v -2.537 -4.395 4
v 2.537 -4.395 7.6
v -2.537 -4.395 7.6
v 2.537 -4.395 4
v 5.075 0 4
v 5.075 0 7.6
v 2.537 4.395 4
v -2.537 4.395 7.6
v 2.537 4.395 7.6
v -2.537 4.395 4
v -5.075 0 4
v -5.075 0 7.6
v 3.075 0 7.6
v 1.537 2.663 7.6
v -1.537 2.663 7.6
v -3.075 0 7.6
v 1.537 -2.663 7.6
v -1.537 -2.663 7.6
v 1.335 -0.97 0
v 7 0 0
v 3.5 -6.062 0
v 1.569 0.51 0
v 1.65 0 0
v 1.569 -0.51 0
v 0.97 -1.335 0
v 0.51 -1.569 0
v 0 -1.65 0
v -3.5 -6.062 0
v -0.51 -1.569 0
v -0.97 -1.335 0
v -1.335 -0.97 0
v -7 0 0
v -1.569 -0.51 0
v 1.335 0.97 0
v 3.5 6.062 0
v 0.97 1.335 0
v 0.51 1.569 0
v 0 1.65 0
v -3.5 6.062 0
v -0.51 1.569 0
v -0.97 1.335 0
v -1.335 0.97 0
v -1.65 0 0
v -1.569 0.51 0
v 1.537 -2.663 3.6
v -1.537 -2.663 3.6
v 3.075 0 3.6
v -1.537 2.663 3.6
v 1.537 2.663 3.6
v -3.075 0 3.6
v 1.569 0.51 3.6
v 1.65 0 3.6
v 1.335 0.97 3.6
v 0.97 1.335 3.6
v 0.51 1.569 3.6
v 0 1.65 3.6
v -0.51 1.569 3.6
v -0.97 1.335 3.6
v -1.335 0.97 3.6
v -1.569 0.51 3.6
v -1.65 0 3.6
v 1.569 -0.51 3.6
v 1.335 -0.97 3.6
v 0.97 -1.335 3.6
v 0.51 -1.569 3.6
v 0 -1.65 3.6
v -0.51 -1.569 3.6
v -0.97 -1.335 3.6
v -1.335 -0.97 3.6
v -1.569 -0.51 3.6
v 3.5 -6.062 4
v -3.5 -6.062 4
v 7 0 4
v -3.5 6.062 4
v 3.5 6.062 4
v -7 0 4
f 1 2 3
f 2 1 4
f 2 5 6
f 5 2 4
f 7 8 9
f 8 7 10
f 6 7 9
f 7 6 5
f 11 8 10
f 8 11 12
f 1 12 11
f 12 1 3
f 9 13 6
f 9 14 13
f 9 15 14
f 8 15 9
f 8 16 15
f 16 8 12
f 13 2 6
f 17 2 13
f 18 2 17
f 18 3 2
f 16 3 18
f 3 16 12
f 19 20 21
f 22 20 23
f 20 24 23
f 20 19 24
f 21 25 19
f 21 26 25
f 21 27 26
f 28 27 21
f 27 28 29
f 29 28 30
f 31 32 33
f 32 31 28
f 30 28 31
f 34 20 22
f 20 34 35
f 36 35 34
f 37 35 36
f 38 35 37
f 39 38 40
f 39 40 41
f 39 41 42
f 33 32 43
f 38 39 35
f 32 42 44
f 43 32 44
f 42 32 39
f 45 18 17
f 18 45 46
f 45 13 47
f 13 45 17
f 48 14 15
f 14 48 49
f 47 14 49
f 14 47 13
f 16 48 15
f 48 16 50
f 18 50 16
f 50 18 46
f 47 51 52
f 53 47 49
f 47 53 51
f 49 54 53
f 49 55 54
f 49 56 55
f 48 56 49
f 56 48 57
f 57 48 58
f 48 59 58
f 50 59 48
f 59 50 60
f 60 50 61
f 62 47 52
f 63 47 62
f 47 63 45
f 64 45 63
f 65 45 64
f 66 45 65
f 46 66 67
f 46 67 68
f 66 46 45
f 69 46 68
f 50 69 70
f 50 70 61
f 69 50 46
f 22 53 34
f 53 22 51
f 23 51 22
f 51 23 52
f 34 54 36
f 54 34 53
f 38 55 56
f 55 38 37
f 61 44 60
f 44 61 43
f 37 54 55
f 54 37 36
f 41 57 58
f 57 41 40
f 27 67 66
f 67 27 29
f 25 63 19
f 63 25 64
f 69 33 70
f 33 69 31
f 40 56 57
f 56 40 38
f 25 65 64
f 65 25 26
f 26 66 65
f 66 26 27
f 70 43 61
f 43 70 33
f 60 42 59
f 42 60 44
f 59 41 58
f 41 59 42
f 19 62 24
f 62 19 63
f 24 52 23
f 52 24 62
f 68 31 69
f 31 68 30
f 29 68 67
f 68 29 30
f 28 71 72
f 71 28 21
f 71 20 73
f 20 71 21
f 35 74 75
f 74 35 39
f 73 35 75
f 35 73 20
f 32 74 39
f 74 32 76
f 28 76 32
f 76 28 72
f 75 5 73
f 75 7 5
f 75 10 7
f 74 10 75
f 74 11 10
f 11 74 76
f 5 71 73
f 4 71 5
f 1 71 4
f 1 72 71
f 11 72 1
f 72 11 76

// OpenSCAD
// file: ../../Dollo/NEW_long_ties/mockups.scad
use <../../Dollo/NEW_long_ties/include.scad>;
use <../../Dollo/NEW_long_ties/mockups.scad>;


//mock_LM8UU();
mock_PSU_Prusa();
//mock_40mm_fan();
//mock_bed_MK42(mount_holes=true);
//mock_steel_sheet();


module mock_LM8UU() {
    color("silver") difference() {
        cylinder(d=15, h=24, center=true, $fn=30);
        cylinder(d=8, h=25, center=true, $fn=30);
    }
}

module mock_PSU_Prusa() {
    w = 98.8;
    h = 199;
    d = 48.5;
    
    color("silver")
    difference() {
        cube([w, h, d]);

        // front cuts
        translate([1.7, -1, 24])
        cube([w - 3.4, 17, d]);

        translate([1.7, -1, 11])
        cube([6, 17, d]);

        // right side screw holes
        translate([w + 1, 25, 24])
        rotate([0, -90, 0])
        cylinder(d=3, h=10, $fn=20);

        translate([w + 1, 25, 11.5])
        rotate([0, -90, 0])
        cylinder(d=3, h=10, $fn=20);

        translate([w + 1, h - 57, 11.5])
        rotate([0, -90, 0])
        cylinder(d=3, h=10, $fn=20);

        translate([w + 1, h - 57, d - 12])
        rotate([0, -90, 0])
        cylinder(d=3, h=10, $fn=20);

        // left side screw holes
        #translate([-10, 25, 12])
        rotate([0, 90, 0])
        cylinder(d=3, h=20, $fn=20);

        #translate([-10, h - 57, 12])
        rotate([0, 90, 0])
        cylinder(d=3, h=20, $fn=20);

        // bottom screw holes
        translate([8.3, 22.2, -0.1])
        cylinder(d=3, h=10, $fn=20);

        translate([w - 30, 25, -0.1])
        cylinder(d=3, h=10, $fn=20);

        translate([10, h - 11, -0.1])
        cylinder(d=3, h=10, $fn=20);

        translate([w - 10, h - 11, -0.1])
        cylinder(d=3, h=10, $fn=20);

        // side slots
        hull() {
            translate([-1, 9, 14])
            rotate([0, 90, 0])
            cylinder(d=4, h=4, $fn=20);

            translate([-1, 9, d - 13])
            rotate([0, 90, 0])
            cylinder(d=4, h=4, $fn=20);

        }

        hull() {
            translate([w + 1, 9, 11])
            rotate([0, -90, 0])
            cylinder(d=4, h=4, $fn=20);

            translate([w + 1, 9, d - 13])
            rotate([0, -90, 0])
            cylinder(d=4, h=4, $fn=20);
        }

        translate([w + 1, 9, d - 17.5])
        rotate([0, -90, 0])
        cylinder(d=8, h=10, $fn=20);

    }
}

module mock_40mm_fan() {
    difference() {
        translate([0, 0, 11/2])
        rounded_cube_side(40, 40, 11, 3, center=true);

        translate([0, 0, -0.1])
        cylinder(d=39, h=12, $fn=40);

        for(i=[0:3]) {
            rotate([0, 0, i*360/4])
            translate([32.5/2, 32.5/2, 0])
            cylinder(d=3.5, h=12, $fn=20);
        }
    }
}

module mock_bed_MK42(mount_holes=false) {
    difference() {
        union() {
            translate([0, 0, 3.3/2])
            chamfered_cube_side(
                254, 235, 3.3, 4, center=true
            );

            translate([
                -254/2 + 4 + 29/2,
                235/2 + 15/2 - 0.7,
                3.3/2
            ])
            chamfered_cube_side(
                29, 15, 3.3, 1, center=true
            );

            color("grey")
            translate([-254/2 + 24, -235/2 + 10, -5.2])
            M3_nut(5.2, cone=false);

            color("grey")
            translate([254/2 - 21, -235/2 + 10, -5.2])
            M3_nut(5.2, cone=false);

            color("grey")
            translate([
                -254/2 + 24, -235/2 + 10 + 209, -5.2
            ])
            M3_nut(5.2, cone=false);

            color("grey")
            translate([
                254/2 - 21, -235/2 + 10 + 209, -5.2
            ])
            M3_nut(5.2, cone=false);

            color("grey")
            translate([1.5, -235/2 + 10 + 84.5, -5.2])
            M3_nut(5.2, cone=false);

            color("grey")
            translate([1.5, -235/2 + 10 + 84.5 + 41, -5.2])
            M3_nut(5.2, cone=false);
        }

        translate([
            -254/2 + 4 + 29/2,
            235/2 + 15 - 0.7 - 7.5, 0,
        ])
        cylinder(d=3, h=20, center=true, $fn=20);

        if (mount_holes) {
            translate([-254/2 + 24, -235/2 + 10, -5.2])
            cylinder(d=2, h=30, center=true, $fn=20);

            translate([254/2 - 21, -235/2 + 10, -5.2])
            cylinder(d=2, h=30, center=true, $fn=20);

            translate([
                -254/2 + 24, -235/2 + 10 + 209, -5.2
            ])
            cylinder(d=2, h=30, center=true, $fn=20);

            translate([
                254/2 - 21, -235/2 + 10 + 209, -5.2
            ])
            cylinder(d=2, h=30, center=true, $fn=20);

            translate([1.5, -235/2 + 10 + 84.5, -5.2])
            cylinder(d=2, h=30, center=true, $fn=20);

            translate([1.5, -235/2 + 10 + 84.5 + 41, -5.2])
            cylinder(d=2, h=30, center=true, $fn=20);
        }
    }

    translate([-20, 0, -3/2])
    rotate([-90, 0, 43])
    cylinder(d=3, h=130);

    translate([-109, 95, -3/2])
    rotate([-90, 0, 0])
    cylinder(d=3, h=130);

}

module mock_steel_sheet() {
    difference() {
        translate([0, 0, 0.75/2])
        rounded_cube_side(
            254, 241, 0.75, 10, center=true, $fn=30
        );

        translate([-254/2 + 54, - 241/2 + 5, 0])
        cylinder(d=3, h=10, center=true, $fn=20);

        translate([254/2 - 54, - 241/2 + 5, 0])
        cylinder(d=3, h=10, center=true, $fn=20);

        hull() {
            translate([0, 241/2, 0])
            cube([142, 8, 10], center=true);

            translate([0, 241/2 + 0.1/2, 0])
            cube([147, 0.1, 10], center=true);

        }
        

    }
}
// file: y-belt-holder.scad
// PRUSA iteration3
// Y belt holder
// GNU GPL v3
// Josef Průša <iam@josefprusa.cz> and contributors
// http://www.reprap.org/wiki/Prusa_Mendel
// http://prusamendel.org

use <../../Dollo/NEW_long_ties/include.scad>;

//debug_y_belt_holder_printed_carriage();

//y_belt_holder();

//y_belt_holder_printed_carriage();
y_belt_holder_printed_carriage_2();


module debug_y_belt_holder_printed_carriage() {
    translate([0, 0, 26])
    rotate([-90, 0, 0])
    y_belt_holder_printed_carriage();

    translate([15, -2.5, 0])
    rotate([0, 0, 180])
    y_belt_holder_printed_carriage_2();
}


module main_body(pc=false) {
    translate([-1, -1, -1 ])
    cube([30, 27, 15]);

    translate([-10, 16, -1])
    cube([50.5, 10, 15]);

    if (pc) {
        hull() {
            translate([30, 26, 15])
            rotate([90, 0, 0])
            cylinder(d=12, h=8, $fn=30);

            translate([30, 26 - 8/2, 10])
            cube([16, 8, 1], center=true);
        }

        hull() {
            translate([1, 26, 15])
            rotate([90, 0, 0])
            cylinder(d=12, h=8, $fn=30);

            translate([1, 26 - 8/2, 10])
            cube([16, 8, 1], center=true);
        }
        
    }

    translate([-10, 23, -1])
    cube([52, 3, 15]);
}

module belt_holders()
{
    // upper belt holder
    translate([16, 18, 0])
    cylinder(h=11, r=3.5, $fn=30);

    // upper belt holder cone
    translate([16, 18, 11])
    cylinder(h=3, r1=3.5, r2=2.5, $fn=30);

    // lower belt holder
    translate([12, 5, 0])
    cylinder(h=11, r=3.5, $fn=30);

    // lower belt holder cone
    translate([12, 5, 11])
    cylinder(h=3, r1=3.5, r2=2.5, $fn=30);
}

module screws(pc=false)
{
    if(pc) {
        //screw head hole
        translate([-4, 28, 7.5])
        rotate([90, 0, 0])
        cylinder(h=4, r=4, $fn=30);

        //screw head hole
        translate([37, 28, 7.5])
        rotate([90, 0, 0])
        cylinder(h=4, r=4, $fn=30);

        // mount screw hole
        translate([1, 26, 17])
        rotate([90, 0, 0])
        cylinder(d=3.2, h=30, center=true, $fn=30);

        // mount screw hole
        translate([30, 26, 17])
        rotate([90, 0, 0])
        cylinder(d=3.2, h=30, center=true, $fn=30);

        // mount screw head hole
        translate([1, 18, 17])
        rotate([90, 0, 0])
        cylinder(d=8, h=30, $fn=30);

        // mount screw head hole
        translate([30, 18, 17])
        rotate([90, 0, 0])
        cylinder(d=8, h=30, $fn=30);

        translate([7, 23, 0])
        cylinder(d=2.8, h=25, center=true, $fn=20);

        translate([25, 23, 0])
        cylinder(d=2.8, h=25, center=true, $fn=20);


    } else {
        //screw hole
        translate([-2.5, 28, 7.5])
        rotate([90, 0, 0])
        cylinder(h=10, r=1.6, $fn=30);

        //screw hole
        translate([-5.5, 28, 7.5])
        rotate([90, 0, 0])
        cylinder(h=10, r=1.6, $fn=30);

        //screw hole - head
        translate([-2.5, 22, 7.5])
        rotate([90, 0, 0])
        cylinder(h=7, r=3, $fn=30);

        //screw hole - head
        translate([-5.5, 22, 7.5])
        rotate([90, 0, 0])
        cylinder(h=10, r=3, $fn=30);

        //screw hole
        translate([35.5, 28, 7.5])
        rotate([90, 0, 0])
        cylinder(h=10, r=1.6, $fn=30);

        //screw hole
        translate([38.5, 28, 7.5])
        rotate([90, 0, 0])
        cylinder(h=10, r=1.6, $fn=30);

        //screw hole - head
        translate([35.5, 22, 7.5])
        rotate([90, 0, 0])
        cylinder(h=10, r=3, $fn=30);

        //screw hole - head
        translate([38.5, 22, 7.5])
        rotate([90, 0, 0])
        cylinder(h=10, r=3, $fn=30);
        
        translate([-5.5, 21, 5.9])
        cube([3, 6, 3.2]);

        translate([35.5, 21, 5.9])
        cube([3, 6, 3.2]);

        translate([-5.5, 15, 4.5])
        cube([3, 7, 6]);

        translate([35.5, 15, 4.5])
        cube([6, 7, 6]);
    }
}

//belt_holders();
module main(pc=false) {
    difference() {
        main_body(pc=pc);

        // upper belt space cutaway
        translate([16, 18, 2])
        cylinder(h=16, r=7.2, $fn=30);

        // lower belt space cutaway
        translate([12, 5, 2])
        cylinder(h=16, r=7.2, $fn=30);

        translate([-20, 9, 2])
        cube([28, 2.1, 16]); 

        rotate([0, 0, 40])
        translate([11, 1, 2])
        cube([10, 4, 16]);     
    
        translate([10, 7, 2 ])
        cube([32, 2.1, 16]); 

        translate([16, 8, 11])
        rotate([45, 0, 0])
        cube([15, 5, 5]);     

        translate([-2, 10, 11])
        rotate([45, 0, 0])
        cube([10, 5, 5]);     

        screws(pc=pc);

        // corner cutoff
        translate([30, -13, -2])
        rotate([0, 0, 45])
        cube([10, 10, 20]);    

        translate([-2, -13, -2])
        rotate([0, 0, 45])
        cube([10, 10, 20]);    
    }
}

module selective_infill()
{
    // print part reinforcement
    translate([1, 0.5, -0.5])
    cube([0.1, 5, 13]);

    translate([3, 0.5, -0.5])
    cube([0.1, 5, 13]);

    translate([21.5, 0.5, -0.5])
    cube([0.1, 4, 12]);

    translate([23.5, 0.5, -0.5])
    cube([0.1, 4, 12]);

    translate([25.5, 0.5, -0.5])
    cube([0.1, 4, 12]);

    translate([11.5, 3, -0.5])
    cube([1, 0.2, 12]);

    translate([10, 5, -0.5])
    cube([4, 0.2, 12]);

    translate([11.5, 6.5, -0.5])
    cube([1, 0.2, 12]);

    translate([15.5, 16, -0.5])
    cube([1, 0.2, 12]);

    translate([14, 18, -0.5])
    cube([4, 0.2, 12]);

    translate([15.5, 20, -0.5])
    cube([1, 0.2, 12]);   

    translate([1, 5.5, -0.5])
    cube([0.1, 14, 2]);    

    translate([3, 5.5, -0.5])
    cube([0.1, 14, 2]);   

    translate([5, 0.5, -0.5])
    cube([0.1, 19, 2]);   

    translate([7, 0.5, -0.5])
    cube([0.1, 19, 2]);   

    translate([19.5, 0.5, -0.5])
    cube([0.1, 18, 2]);

    translate([21.5, 4.5, -0.5])
    cube([0.1, 14, 2]);

    translate([23.5, 4.5, -0.5])
    cube([0.1, 14, 2]);

    translate([25.5, 4.5, -0.5])
    cube([0.1, 14, 2]);
}
    
    
module y_belt_holder() {
    difference() {
        union() {
            main();
            belt_holders();  
        }
        selective_infill();
    }
}

module y_belt_holder_printed_carriage() {
    difference() {
        union() {
            main(pc=true);
            belt_holders();  
        }
        selective_infill();
    }
}

module y_belt_holder_printed_carriage_2() {
    difference() {
        intersection() {
            translate([0, 0, 8/2])
            rounded_cube_side(
                42, 12, 8, 8, center=true, $fn=30
            );

            translate([0, 4.5, 0])
            cube([50, 12, 30], center=true);
        }

        translate([-32/2, 2, 0])
        cylinder(d=3.2, h=30, center=true, $fn=20);

        translate([32/2, 2, 0])
        cylinder(d=3.2, h=30, center=true, $fn=20);

        translate([-10, 0, 3])
        rotate([90, 0, 0])
        cylinder(d=3.2, h=30, center=true, $fn=20);

        translate([8, 0, 3])
        rotate([90, 0, 0])
        cylinder(d=3.2, h=30, center=true, $fn=20);

        translate([-10, 3.5, 3])
        rotate([-90, 0, 0])
        cylinder(d=7, h=10, $fn=20);

        translate([8, 3.5, 3])
        rotate([-90, 0, 0])
        cylinder(d=7, h=10, $fn=20);

    }
}
// file: ../../Dollo/NEW_long_ties/globals.scad
/*
Most things in this file is represented as one millimeter, so keep that in mind while changing things.
Some of the setting are not mm but at variables that you can set, such as 2*x=2x and you are setting what x is.
I will try to specify when things are variables and not exact measurements.
*/

// printer slop
slop = 0.15;

obj_leg = 30;
leg_length = 5.5;
small_number = 0.001;
metal_core_rode_global = 5;


///////////////// number of holes /////////////////////
z_hole_number = 8;
other_holes = 8;

///////////////// Pins /////////////////////

//pins that poke out
ball_size = 10;
pin_height = 20;
pin_diameter = 6;


//holes
hole_ball_size = ball_size;
hole_pin_height = pin_height;
hole_pin_diameter = pin_diameter;

///////////////// Z THINGS /////////////////////

berring_slot_width = 7.5;
berring_slot_depth = 6.5;
metal_core_rode = 5;

///////////////// X THINGS /////////////////////

//male dove tails
male_dove_max_width=8;
male_dove_min_width=5;
male_dove_depth=5;
male_dove_height=obj_leg/2;

function scaled_male_dove_max_width() = male_dove_max_width - slop;
function scaled_male_dove_min_width() = male_dove_min_width - slop;
function scaled_male_dove_depth() = male_dove_depth - slop;

//female dove tails, this is found on the y mounts
girl_max_width=11;
girl_min_width=5;
girl_depth=5;
girl_height=obj_leg;


///////////////// Y THINGS /////////////////////
/*
The Y is so normal that all of those global variables at the top should change all of the setting in it, this section is set her incase there are variables set in the future development of this project.
*/

// stepper
motor_side_length = 43.2;
motor_bolt_hole_distance = 31;
motor_center_hole = 23;
motor_shaft_dia = 5;
motor_shaft_hole_dia = 5+2*slop;

// bolts etc.
bolt_hole_dia = 3+2*slop;
bolt_head_hole_dia = 5.8;

m4_bolt_hole_dia = 4+2*slop;
m4_bolt_head_hole_dia = 6.8+2*slop;


m3_nut_side = 5.65;
m3_nut_height = 2.3;
m4_nut_side = 6.85;
m4_nut_height = 3.1;

// threaded rod
lifter_rod_diam = 9.86;
hole_threaded_rod = lifter_rod_diam+2*slop;

// for the extensions
metal_rod_size = 9;
// file: mockups.scad
use <../../Dollo/NEW_long_ties/include.scad>;
use <../../Dollo/NEW_long_ties/mockups.scad>;


//mock_LM8UU();
mock_PSU_Prusa();
//mock_40mm_fan();
//mock_bed_MK42(mount_holes=true);
//mock_steel_sheet();


module mock_LM8UU() {
    color("silver") difference() {
        cylinder(d=15, h=24, center=true, $fn=30);
        cylinder(d=8, h=25, center=true, $fn=30);
    }
}

module mock_PSU_Prusa() {
    w = 98.8;
    h = 199;
    d = 48.5;
    
    color("silver")
    difference() {
        cube([w, h, d]);

        // front cuts
        translate([1.7, -1, 24])
        cube([w - 3.4, 17, d]);

        translate([1.7, -1, 11])
        cube([6, 17, d]);

        // right side screw holes
        translate([w + 1, 25, 24])
        rotate([0, -90, 0])
        cylinder(d=3, h=10, $fn=20);

        translate([w + 1, 25, 11.5])
        rotate([0, -90, 0])
        cylinder(d=3, h=10, $fn=20);

        translate([w + 1, h - 57, 11.5])
        rotate([0, -90, 0])
        cylinder(d=3, h=10, $fn=20);

        translate([w + 1, h - 57, d - 12])
        rotate([0, -90, 0])
        cylinder(d=3, h=10, $fn=20);

        // left side screw holes
        #translate([-10, 25, 12])
        rotate([0, 90, 0])
        cylinder(d=3, h=20, $fn=20);

        #translate([-10, h - 57, 12])
        rotate([0, 90, 0])
        cylinder(d=3, h=20, $fn=20);

        // bottom screw holes
        translate([8.3, 22.2, -0.1])
        cylinder(d=3, h=10, $fn=20);

        translate([w - 30, 25, -0.1])
        cylinder(d=3, h=10, $fn=20);

        translate([10, h - 11, -0.1])
        cylinder(d=3, h=10, $fn=20);

        translate([w - 10, h - 11, -0.1])
        cylinder(d=3, h=10, $fn=20);

        // side slots
        hull() {
            translate([-1, 9, 14])
            rotate([0, 90, 0])
            cylinder(d=4, h=4, $fn=20);

            translate([-1, 9, d - 13])
            rotate([0, 90, 0])
            cylinder(d=4, h=4, $fn=20);

        }

        hull() {
            translate([w + 1, 9, 11])
            rotate([0, -90, 0])
            cylinder(d=4, h=4, $fn=20);

            translate([w + 1, 9, d - 13])
            rotate([0, -90, 0])
            cylinder(d=4, h=4, $fn=20);
        }

        translate([w + 1, 9, d - 17.5])
        rotate([0, -90, 0])
        cylinder(d=8, h=10, $fn=20);

    }
}

module mock_40mm_fan() {
    difference() {
        translate([0, 0, 11/2])
        rounded_cube_side(40, 40, 11, 3, center=true);

        translate([0, 0, -0.1])
        cylinder(d=39, h=12, $fn=40);

        for(i=[0:3]) {
            rotate([0, 0, i*360/4])
            translate([32.5/2, 32.5/2, 0])
            cylinder(d=3.5, h=12, $fn=20);
        }
    }
}

module mock_bed_MK42(mount_holes=false) {
    difference() {
        union() {
            translate([0, 0, 3.3/2])
            chamfered_cube_side(
                254, 235, 3.3, 4, center=true
            );

            translate([
                -254/2 + 4 + 29/2,
                235/2 + 15/2 - 0.7,
                3.3/2
            ])
            chamfered_cube_side(
                29, 15, 3.3, 1, center=true
            );

            color("grey")
            translate([-254/2 + 24, -235/2 + 10, -5.2])
            M3_nut(5.2, cone=false);

            color("grey")
            translate([254/2 - 21, -235/2 + 10, -5.2])
            M3_nut(5.2, cone=false);

            color("grey")
            translate([
                -254/2 + 24, -235/2 + 10 + 209, -5.2
            ])
            M3_nut(5.2, cone=false);

            color("grey")
            translate([
                254/2 - 21, -235/2 + 10 + 209, -5.2
            ])
            M3_nut(5.2, cone=false);

            color("grey")
            translate([1.5, -235/2 + 10 + 84.5, -5.2])
            M3_nut(5.2, cone=false);

            color("grey")
            translate([1.5, -235/2 + 10 + 84.5 + 41, -5.2])
            M3_nut(5.2, cone=false);
        }

        translate([
            -254/2 + 4 + 29/2,
            235/2 + 15 - 0.7 - 7.5, 0,
        ])
        cylinder(d=3, h=20, center=true, $fn=20);

        if (mount_holes) {
            translate([-254/2 + 24, -235/2 + 10, -5.2])
            cylinder(d=2, h=30, center=true, $fn=20);

            translate([254/2 - 21, -235/2 + 10, -5.2])
            cylinder(d=2, h=30, center=true, $fn=20);

            translate([
                -254/2 + 24, -235/2 + 10 + 209, -5.2
            ])
            cylinder(d=2, h=30, center=true, $fn=20);

            translate([
                254/2 - 21, -235/2 + 10 + 209, -5.2
            ])
            cylinder(d=2, h=30, center=true, $fn=20);

            translate([1.5, -235/2 + 10 + 84.5, -5.2])
            cylinder(d=2, h=30, center=true, $fn=20);

            translate([1.5, -235/2 + 10 + 84.5 + 41, -5.2])
            cylinder(d=2, h=30, center=true, $fn=20);
        }
    }

    translate([-20, 0, -3/2])
    rotate([-90, 0, 43])
    cylinder(d=3, h=130);

    translate([-109, 95, -3/2])
    rotate([-90, 0, 0])
    cylinder(d=3, h=130);

}

module mock_steel_sheet() {
    difference() {
        translate([0, 0, 0.75/2])
        rounded_cube_side(
            254, 241, 0.75, 10, center=true, $fn=30
        );

        translate([-254/2 + 54, - 241/2 + 5, 0])
        cylinder(d=3, h=10, center=true, $fn=20);

        translate([254/2 - 54, - 241/2 + 5, 0])
        cylinder(d=3, h=10, center=true, $fn=20);

        hull() {
            translate([0, 241/2, 0])
            cube([142, 8, 10], center=true);

            translate([0, 241/2 + 0.1/2, 0])
            cube([147, 0.1, 10], center=true);

        }
        

    }
}
// file: ../../AluParts/alu-frame.scad
module frame() {
    difference() {
        linear_extrude(6.3, convexity=10)
        import("alu-frame.dxf");

        translate([56, 55, -10])
        cube([250, 271, 30]);

        translate([4.95, 269.5, 0])
        cylinder(d=2.8, h=20, center=true, $fn=20);

        translate([4.95 + 43, 269.5,0])
        cylinder(d=2.8, h=20, center=true, $fn=20);
    }
}

module bed_carriage() {
    translate([-60, -105, 0])
    intersection() {
        linear_extrude(6.3, convexity=10)
        import("alu-frame.dxf");

        translate([58, 100, -10])
        cube([230, 226, 30]);
    }
}

bed_carriage();
// main file
use <../../AluParts/alu-frame.scad>;
use <mockups.scad>;
use <../../Dollo/NEW_long_ties/include.scad>;
include <../../Dollo/NEW_long_ties/globals.scad>;
use <y-belt-holder.scad>;


//debug();

//bed_carriage();

//bed_carriage_arm();

//bed_carriage_washer();
//bed_carriage_washer_center();

// bit taller washers
//bed_carriage_washer(7.6);
bed_carriage_washer_center(7.6);


module debug() {

    color("grey")
    translate([
        -220/2 + 5.5, -220/2 + 220 - 5.5, 7/2
    ])
    rotate([0, 0, 45])
    bed_carriage_arm();

    translate([-220/2, -220/2, 0])
    bed_carriage();
}


module original_bed() {
    translate([0,220,6.3]) rotate([180,0,0]) bed_carriage();

    color("black") {
        bolt_holes(d=1,h=1);
        translate([25,75,0]) cube([10,10,10],center=true);
        bearing_holes();
    }
}


module bolt_holes(d=bolt_hole_dia,h=10) {
    $fn=20;
    translate([5.5,5.5,0]) cylinder(d=d,h=h);
    translate([5.5,220-5.5,0]) cylinder(d=d,h=h);
    translate([220-5.5,5.5,0]) cylinder(d=d,h=h);
    translate([220-5.5,220-5.5,0]) cylinder(d=d,h=h);

    translate([15,75,0]) cylinder(d=d,h=h);
    translate([15,220-75,0]) cylinder(d=d,h=h);
    translate([35,75,0]) cylinder(d=d,h=h);
    translate([35,220-75,0]) cylinder(d=d,h=h);

    translate([220-15,220/2,0]) cylinder(d=d,h=h);
    translate([220-35,220/2,0]) cylinder(d=d,h=h);

    translate([220/2,220-89,0]) cylinder(d=d,h=h);
    translate([220/2,90,0]) cylinder(d=d,h=h);
}

module bearing_holes() {
    side = sqrt(2*5*5);
    module hole() {
        hull() {
            translate([0,0,-5]) rotate([0,45,0]) cube([side,24.2,side],center=true);
            translate([0,0,5]) rotate([0,45,0]) cube([side,24.2,side],center=true);
        }
    }

    top = 14;
    bottom = -5;

    translate([25,75,top]) hole();
    //translate([25,75,bottom]) hole();

    translate([25,220-75,top]) hole();
    //translate([25,220-75,bottom]) hole();

    translate([220-25,220/2,top]) hole();
    //translate([220-25,220/2,bottom]) hole();
}

module bed_carriage() {
    module arm_coutout() {
        _bed_arm_body();
        translate([-20,bed_arm_hole_pos,0]) rotate([0,90,0]) cylinder(d=bolt_hole_dia,h=40,$fn=20);
        translate([-18.2,bed_arm_hole_pos,0]) rotate([0,-90,0]) M3_nut(3);
        translate([18,bed_arm_hole_pos,0]) rotate([0,90,0]) cylinder(d=bolt_head_hole_dia,h=80,$fn=20);
    }

    difference() {
        intersection() {
            union() {
                translate([0,10,0]) cube([220,200,7]);
                translate([11,61,7]) rounded_cube_side(28,28,2,3);
                translate([11,131,7]) rounded_cube_side(28,28,2,3);
                translate([220-11-28,96,7]) rounded_cube_side(28,28,2,3);
                translate([220/2-8.5,220/2-33.1,7]) difference() {
                    rounded_cube_side(15,68,6,4);
                    translate([-1,8,2]) cube([30,52.2,10]);
                    translate([0,0,8]) rotate([40,0,0]) cube([30,15,15],center=true);
                    translate([0,68,8]) rotate([50,0,0]) cube([30,15,15],center=true);
                }
            }
            translate([220/2,220/2,9/2]) rotate([0,0,45]) cube([285,285,13],center=true);
        }
        translate([0,0,-0.1]) bolt_holes();
        bearing_holes();

        translate([40,180,0]) sphere(d=3,$fn=10);

        translate([65,220/2,-0.1]) cylinder(d=50,h=10);
        translate([220-70,220/2,-0.1]) cylinder(d=45,h=10);

        translate([220-50,60,-0.1]) cylinder(d=20,h=10);
        translate([220-50,220-60,-0.1]) cylinder(d=20,h=10);

        translate([50,60,-0.1]) cylinder(d=20,h=10);
        translate([50,220-60,-0.1]) cylinder(d=20,h=10);

        translate([220/2,0,0]) hull() {
            translate([0,221]) cube([161,2,20],center=true);
            translate([0,156]) cube([31,2,20],center=true);
        }

        translate([220/2,0,0]) hull() {
            translate([0,-1]) cube([161,1,20],center=true);
            translate([0,65]) cube([31,1,20],center=true);
        }

        translate([-12,175,0]) rotate([0,0,45]) cube([40,40,20],center=true);
        translate([-12,45,0]) rotate([0,0,45]) cube([40,40,20],center=true);

        translate([5+220,167,0]) rotate([0,0,45]) cube([40,40,20],center=true);
        translate([5+220,53,0]) rotate([0,0,45]) cube([40,40,20],center=true);

        translate([0,220/2,0]) cube([20,120,20],center=true);
        translate([220,220/2,0]) cube([20,110,20],center=true);

        translate([5.5,220-5.5,7/2]) rotate([0,0,45]) arm_coutout();
        translate([5.5,5.5,7/2]) rotate([0,0,135]) arm_coutout();
        translate([220-5.5,5.5,7/2]) rotate([0,0,225]) arm_coutout();
        translate([220-5.5,220-5.5,7/2]) rotate([0,0,-45]) arm_coutout();
        
        // hidden infill
        #translate([220/2,220/2,7/2]) rotate([90,0,38]) {
            translate([0,1.5,0]) cylinder(d=0.1,h=300,center=true);
            cylinder(d=0.1,h=300,center=true);
            translate([0,-1.5,0]) cylinder(d=0.1,h=300,center=true);
        }
        #translate([220/2,220/2,7/2]) rotate([90,0,-38]) {
            translate([0,1.5,0]) cylinder(d=0.1,h=300,center=true);
            cylinder(d=0.1,h=300,center=true);
            translate([0,-1.5,0]) cylinder(d=0.1,h=300,center=true);
        }
        #translate([220/2,220/2-30,7/2]) rotate([0,90,0]) {
            translate([1.5,0,0]) cylinder(d=0.1,h=300,center=true);
            cylinder(d=0.1,h=300,center=true);
            translate([-1.5,0,0]) cylinder(d=0.1,h=300,center=true);
        }
        #translate([220/2,220/2+30,7/2]) rotate([0,90,0]) {
            translate([1.5,0,0]) cylinder(d=0.1,h=300,center=true);
            cylinder(d=0.1,h=300,center=true);
            translate([-1.5,0,0]) cylinder(d=0.1,h=300,center=true);
        }
    }

    translate([50,25,0]) cube([120,10,7]);
    translate([50,220-25-10,0]) cube([120,10,7]);

//    translate([-80.6,83.5,-58.92]) rotate([90,0,0])
//    {
//        import("../../../_downloaded/Prusa/LM8UU_Clip_V2_CompleteSet_ScrewFromTopOnly(2).stl");
//        translate([105.65,71.4,7.5]) mock_LM8UU();
//    }
    %translate([220/2-7.5,220/2+17,35]) rotate([-90,0,-90]) y_belt_holder();
    //%translate([11,61,7]) qnd_bearing_fix();
    //%translate([220/2-8.5,220/2-33.1,7]) qnd_belt_holder_fix();
}

bed_arm_l = 40;
bed_arm_hole_pos = -bed_arm_l/2-10;

module _bed_arm_body(length=bed_arm_l) {
    side = sqrt(2*3.51*3.51); 
    hull() {
        cylinder(d=10,h=7,center=true);
        translate([-7,-length/2-5,0]) rotate([0,45,0]) cube([side,length,side], center=true);
        translate([7,-length/2-5,0]) rotate([0,45,0]) cube([side,length,side], center=true);
        translate([0,-length-5-7/2+1/2,0]) cube([14,1,.2],center=true);
    }
}

module bed_carriage_arm() {
    difference() {
        _bed_arm_body(bed_arm_l-0.2);
        translate([0,0,-0.1]) cylinder(d=bolt_hole_dia,h=10,center=true,$fn=20);
        translate([0,0,7]) cylinder(d=bolt_head_hole_dia,h=10,center=true,$fn=20);
        //translate([0,-bed_arm_l,0]) cube([2,21,10],center=true);
        translate([-20,bed_arm_hole_pos,0]) rotate([0,90,0]) cylinder(d=bolt_hole_dia,h=60,$fn=20);
    }
}

module bed_carriage_washer(h=7) {
    difference() {
        cylinder(d=10 + slop, h=h, $fn=6);

        translate([0, 0, h - 4])
        cylinder(d=6 + slop, h=h, $fn=6);

        translate([0, 0, -0.1])
        cylinder(d=bolt_hole_dia, h=h, $fn=20);
    }
}

module bed_carriage_washer_center(h=7) {
    union() {
        bed_carriage_washer(h=h);

        tube(14, 4, 3, $fn=6);
    }
}

// QND FIXES, DO NOT USE
module qnd_bearing_fix() {
    side = sqrt(2*5*5);
    module hole() {
        hull() {
            translate([0,0,-5]) rotate([0,45,0]) cube([side,24.2,side],center=true);
            translate([0,0,5]) rotate([0,45,0]) cube([side,24.2,side],center=true);
        }
    }
    
    difference() {
        union() {
            rounded_cube_side(29,28,2,4);
            translate([28/2,28/2,-3]) scale([1,0.97,1]) hole();
        }
        translate([4,28/2]) cylinder(d=3.2,h=5,$fn=30);
        translate([28-4,28/2]) cylinder(d=3.2,h=5,$fn=30);
        translate([28/2,28/2,-5]) hole();
    }
}

module qnd_belt_holder_fix() {
    difference() {
        rounded_cube_side(15,68,6,4);
        translate([-1,8,2]) cube([30,52.2,10]);
        translate([0,0,8]) rotate([40,0,0]) cube([30,10,10],center=true);
        translate([0,68,8]) rotate([50,0,0]) cube([30,10,10],center=true);
        
        translate([15/2,4,0]) cylinder(d=3.2,h=10,$fn=30);
        translate([15/2,4,2]) cylinder(d=6.7,h=10,$fn=30);
        translate([15/2,68-4,0]) cylinder(d=3.2,h=10,$fn=30);
        translate([15/2,68-4,2]) cylinder(d=6.7,h=10,$fn=30);
        
        translate([15/2+1,13,0]) cylinder(d=3.2,h=10,$fn=30);
        translate([15/2+1,67.5-13.5,0]) cylinder(d=3.2,h=10,$fn=30);
    }
}
//qnd_bearing_fix();
//qnd_belt_holder_fix();
// END QND
